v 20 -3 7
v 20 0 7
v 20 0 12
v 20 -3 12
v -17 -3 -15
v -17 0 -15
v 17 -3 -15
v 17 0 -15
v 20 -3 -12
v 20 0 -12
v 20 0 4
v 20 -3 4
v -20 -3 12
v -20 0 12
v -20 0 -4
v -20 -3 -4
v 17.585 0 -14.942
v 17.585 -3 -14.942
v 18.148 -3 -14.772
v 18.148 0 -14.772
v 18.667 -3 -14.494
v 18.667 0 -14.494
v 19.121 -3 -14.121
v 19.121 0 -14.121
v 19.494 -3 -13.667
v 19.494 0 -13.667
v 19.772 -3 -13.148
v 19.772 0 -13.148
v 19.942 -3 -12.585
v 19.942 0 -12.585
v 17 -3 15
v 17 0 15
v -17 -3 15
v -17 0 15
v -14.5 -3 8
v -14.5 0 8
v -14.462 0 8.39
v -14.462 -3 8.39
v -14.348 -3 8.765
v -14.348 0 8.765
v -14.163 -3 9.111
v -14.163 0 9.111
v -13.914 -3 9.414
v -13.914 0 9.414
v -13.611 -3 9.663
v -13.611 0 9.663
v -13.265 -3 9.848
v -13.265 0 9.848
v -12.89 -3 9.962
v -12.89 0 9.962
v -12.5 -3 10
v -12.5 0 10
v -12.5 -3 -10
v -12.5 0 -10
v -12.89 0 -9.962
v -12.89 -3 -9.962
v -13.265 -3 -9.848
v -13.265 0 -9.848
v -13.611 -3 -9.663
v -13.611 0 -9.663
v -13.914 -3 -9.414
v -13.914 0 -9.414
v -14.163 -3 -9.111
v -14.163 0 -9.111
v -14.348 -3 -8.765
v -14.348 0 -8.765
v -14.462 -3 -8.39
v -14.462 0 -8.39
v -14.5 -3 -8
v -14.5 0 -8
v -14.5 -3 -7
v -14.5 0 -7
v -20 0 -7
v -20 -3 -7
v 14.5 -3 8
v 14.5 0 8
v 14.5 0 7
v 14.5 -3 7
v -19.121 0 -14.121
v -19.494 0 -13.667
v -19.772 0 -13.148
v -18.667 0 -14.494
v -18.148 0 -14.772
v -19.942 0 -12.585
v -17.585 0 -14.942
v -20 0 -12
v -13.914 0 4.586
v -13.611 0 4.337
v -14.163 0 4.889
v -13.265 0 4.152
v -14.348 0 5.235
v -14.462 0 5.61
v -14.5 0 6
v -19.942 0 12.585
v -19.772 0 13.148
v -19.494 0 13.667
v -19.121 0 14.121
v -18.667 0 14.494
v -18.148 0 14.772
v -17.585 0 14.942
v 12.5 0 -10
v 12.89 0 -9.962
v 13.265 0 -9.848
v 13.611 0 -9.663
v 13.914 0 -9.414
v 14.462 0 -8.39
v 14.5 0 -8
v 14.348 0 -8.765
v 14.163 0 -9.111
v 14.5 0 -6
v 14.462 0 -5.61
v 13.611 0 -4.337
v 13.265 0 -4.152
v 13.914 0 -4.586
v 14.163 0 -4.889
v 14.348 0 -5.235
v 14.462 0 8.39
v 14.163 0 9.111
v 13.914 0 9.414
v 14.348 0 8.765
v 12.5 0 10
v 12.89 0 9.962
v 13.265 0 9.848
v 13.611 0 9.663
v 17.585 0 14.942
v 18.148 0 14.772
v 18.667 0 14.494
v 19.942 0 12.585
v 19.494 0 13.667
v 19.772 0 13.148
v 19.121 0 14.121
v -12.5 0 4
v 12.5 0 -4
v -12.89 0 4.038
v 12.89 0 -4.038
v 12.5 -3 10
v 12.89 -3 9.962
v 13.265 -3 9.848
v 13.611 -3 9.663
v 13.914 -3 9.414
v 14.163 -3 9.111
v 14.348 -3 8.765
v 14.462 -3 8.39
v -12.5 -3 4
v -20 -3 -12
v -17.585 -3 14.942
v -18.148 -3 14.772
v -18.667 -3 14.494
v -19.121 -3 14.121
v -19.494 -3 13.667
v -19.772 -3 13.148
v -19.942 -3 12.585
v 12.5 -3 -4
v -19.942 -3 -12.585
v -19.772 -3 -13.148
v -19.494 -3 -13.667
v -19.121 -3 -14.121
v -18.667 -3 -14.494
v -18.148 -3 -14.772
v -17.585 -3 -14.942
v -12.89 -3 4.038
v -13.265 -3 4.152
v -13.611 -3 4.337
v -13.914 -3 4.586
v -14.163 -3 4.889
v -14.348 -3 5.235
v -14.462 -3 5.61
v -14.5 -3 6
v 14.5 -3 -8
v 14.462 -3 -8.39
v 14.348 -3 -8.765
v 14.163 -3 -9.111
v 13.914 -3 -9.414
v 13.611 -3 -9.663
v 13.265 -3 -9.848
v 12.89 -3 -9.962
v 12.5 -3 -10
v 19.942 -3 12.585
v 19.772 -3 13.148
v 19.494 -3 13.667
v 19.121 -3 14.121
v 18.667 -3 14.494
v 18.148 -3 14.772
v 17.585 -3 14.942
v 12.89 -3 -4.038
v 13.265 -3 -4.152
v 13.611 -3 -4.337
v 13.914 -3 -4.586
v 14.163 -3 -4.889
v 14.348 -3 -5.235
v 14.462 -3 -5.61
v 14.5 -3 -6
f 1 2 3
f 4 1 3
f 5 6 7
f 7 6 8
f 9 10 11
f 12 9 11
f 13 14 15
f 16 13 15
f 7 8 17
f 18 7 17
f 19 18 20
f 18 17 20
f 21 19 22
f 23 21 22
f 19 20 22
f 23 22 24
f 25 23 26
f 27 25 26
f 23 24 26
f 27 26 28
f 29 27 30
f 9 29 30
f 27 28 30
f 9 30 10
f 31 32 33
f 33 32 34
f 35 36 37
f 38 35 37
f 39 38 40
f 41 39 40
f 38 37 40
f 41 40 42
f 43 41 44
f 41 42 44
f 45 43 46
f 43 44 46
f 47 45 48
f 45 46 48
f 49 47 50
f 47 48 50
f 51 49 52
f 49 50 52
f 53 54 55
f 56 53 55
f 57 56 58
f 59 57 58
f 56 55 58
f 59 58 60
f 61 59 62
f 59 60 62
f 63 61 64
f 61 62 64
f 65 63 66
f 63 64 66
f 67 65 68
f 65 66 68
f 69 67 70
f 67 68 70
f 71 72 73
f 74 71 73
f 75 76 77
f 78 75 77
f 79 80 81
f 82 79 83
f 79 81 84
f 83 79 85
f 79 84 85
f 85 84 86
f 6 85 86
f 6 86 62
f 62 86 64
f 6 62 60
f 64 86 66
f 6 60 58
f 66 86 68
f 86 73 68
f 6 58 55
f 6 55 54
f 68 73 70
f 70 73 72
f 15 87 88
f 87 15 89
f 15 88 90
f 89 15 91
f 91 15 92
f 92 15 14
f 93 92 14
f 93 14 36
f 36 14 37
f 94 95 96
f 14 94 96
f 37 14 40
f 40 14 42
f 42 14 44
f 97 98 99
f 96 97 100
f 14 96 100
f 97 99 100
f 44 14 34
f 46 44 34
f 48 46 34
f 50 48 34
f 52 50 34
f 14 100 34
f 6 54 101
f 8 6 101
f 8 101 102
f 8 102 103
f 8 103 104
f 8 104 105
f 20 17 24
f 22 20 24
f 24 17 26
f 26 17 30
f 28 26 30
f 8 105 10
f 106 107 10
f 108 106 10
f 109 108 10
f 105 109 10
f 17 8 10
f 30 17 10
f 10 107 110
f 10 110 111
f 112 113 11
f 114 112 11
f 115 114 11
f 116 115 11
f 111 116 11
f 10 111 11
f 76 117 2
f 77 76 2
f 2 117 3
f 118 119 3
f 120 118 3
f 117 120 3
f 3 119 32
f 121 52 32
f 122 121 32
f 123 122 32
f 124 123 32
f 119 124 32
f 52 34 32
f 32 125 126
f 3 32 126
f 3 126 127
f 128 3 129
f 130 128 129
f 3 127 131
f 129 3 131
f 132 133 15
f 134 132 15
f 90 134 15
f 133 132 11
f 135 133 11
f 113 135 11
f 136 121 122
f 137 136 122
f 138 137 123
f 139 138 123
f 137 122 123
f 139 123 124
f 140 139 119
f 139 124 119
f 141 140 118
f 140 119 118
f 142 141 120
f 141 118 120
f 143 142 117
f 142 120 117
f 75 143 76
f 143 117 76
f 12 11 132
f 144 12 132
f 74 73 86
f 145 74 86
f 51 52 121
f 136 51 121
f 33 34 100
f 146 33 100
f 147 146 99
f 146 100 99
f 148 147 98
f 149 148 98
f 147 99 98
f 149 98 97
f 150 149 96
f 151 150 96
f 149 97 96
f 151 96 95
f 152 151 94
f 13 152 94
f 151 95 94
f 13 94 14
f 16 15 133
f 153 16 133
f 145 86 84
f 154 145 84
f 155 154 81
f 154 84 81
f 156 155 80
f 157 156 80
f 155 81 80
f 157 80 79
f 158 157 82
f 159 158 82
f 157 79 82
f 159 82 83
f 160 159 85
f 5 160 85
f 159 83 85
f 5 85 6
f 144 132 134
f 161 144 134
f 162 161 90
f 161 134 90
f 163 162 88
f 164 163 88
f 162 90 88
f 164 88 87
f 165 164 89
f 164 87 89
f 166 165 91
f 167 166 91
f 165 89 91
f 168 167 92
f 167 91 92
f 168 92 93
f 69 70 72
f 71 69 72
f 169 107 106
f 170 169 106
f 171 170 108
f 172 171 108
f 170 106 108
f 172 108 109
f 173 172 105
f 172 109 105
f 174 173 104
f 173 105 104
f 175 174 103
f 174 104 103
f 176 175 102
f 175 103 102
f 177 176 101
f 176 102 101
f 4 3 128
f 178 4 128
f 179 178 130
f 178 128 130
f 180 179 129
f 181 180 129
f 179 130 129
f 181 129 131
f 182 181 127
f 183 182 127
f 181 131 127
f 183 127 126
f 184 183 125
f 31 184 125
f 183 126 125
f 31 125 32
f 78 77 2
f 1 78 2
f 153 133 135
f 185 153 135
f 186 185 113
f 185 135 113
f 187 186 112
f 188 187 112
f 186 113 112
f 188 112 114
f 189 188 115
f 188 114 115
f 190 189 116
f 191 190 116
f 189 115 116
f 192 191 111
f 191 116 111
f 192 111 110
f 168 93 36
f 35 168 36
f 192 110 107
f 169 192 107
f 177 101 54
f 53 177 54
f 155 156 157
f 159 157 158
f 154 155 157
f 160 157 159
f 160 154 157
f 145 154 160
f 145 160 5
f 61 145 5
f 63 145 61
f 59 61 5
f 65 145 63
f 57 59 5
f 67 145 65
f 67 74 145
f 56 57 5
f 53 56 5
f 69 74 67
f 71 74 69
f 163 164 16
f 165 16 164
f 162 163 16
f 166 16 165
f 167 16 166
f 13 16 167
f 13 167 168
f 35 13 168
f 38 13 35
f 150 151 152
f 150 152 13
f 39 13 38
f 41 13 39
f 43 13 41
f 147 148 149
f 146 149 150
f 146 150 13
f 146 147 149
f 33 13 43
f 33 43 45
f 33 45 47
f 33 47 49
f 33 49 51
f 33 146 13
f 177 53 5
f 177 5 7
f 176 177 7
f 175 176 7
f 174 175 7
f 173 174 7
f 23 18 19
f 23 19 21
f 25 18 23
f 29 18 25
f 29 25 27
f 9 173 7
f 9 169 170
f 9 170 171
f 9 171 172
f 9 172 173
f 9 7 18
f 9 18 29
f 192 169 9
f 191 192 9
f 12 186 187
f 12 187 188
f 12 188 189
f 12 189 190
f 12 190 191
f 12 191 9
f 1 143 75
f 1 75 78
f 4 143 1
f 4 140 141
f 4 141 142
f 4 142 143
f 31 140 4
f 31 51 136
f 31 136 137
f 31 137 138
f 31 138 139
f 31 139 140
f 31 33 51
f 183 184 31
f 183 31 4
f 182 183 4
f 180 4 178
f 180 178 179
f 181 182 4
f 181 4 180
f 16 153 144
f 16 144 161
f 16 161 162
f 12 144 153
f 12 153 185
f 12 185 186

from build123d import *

# Parameters (mm, degrees)
F1_DEPTH = 3


with BuildPart() as f1:
    # F0 (on Front) → F1 (new body)
    with BuildSketch(Plane.XZ):
        with BuildLine():
            ThreePointArc((20, 12), (19.12132, 14.12132), (17, 15))
            Line((17, 15), (-17, 15))
            ThreePointArc((-17, 15), (-19.12132, 14.12132), (-20, 12))
            Line((-20, 12), (-20, -4))
            Line((-20, -4), (12.5, -4))
            ThreePointArc((12.5, -4), (13.914214, -4.585786), (14.5, -6))
            Line((14.5, -6), (14.5, -8))
            ThreePointArc((14.5, -8), (13.914214, -9.414214), (12.5, -10))
            Line((12.5, -10), (-12.5, -10))
            ThreePointArc((-12.5, -10), (-13.914214, -9.414214), (-14.5, -8))
            Line((-14.5, -8), (-14.5, -7))
            Line((-14.5, -7), (-20, -7))
            Line((-20, -7), (-20, -12))
            ThreePointArc((-20, -12), (-19.12132, -14.12132), (-17, -15))
            Line((-17, -15), (17, -15))
            ThreePointArc((17, -15), (19.12132, -14.12132), (20, -12))
            Line((20, -12), (20, 4))
            Line((20, 4), (-12.5, 4))
            ThreePointArc((-12.5, 4), (-13.914214, 4.585786), (-14.5, 6))
            Line((-14.5, 6), (-14.5, 8))
            ThreePointArc((-14.5, 8), (-13.914214, 9.414214), (-12.5, 10))
            Line((-12.5, 10), (12.5, 10))
            ThreePointArc((12.5, 10), (13.914214, 9.414214), (14.5, 8))
            Line((14.5, 8), (14.5, 7))
            Line((14.5, 7), (20, 7))
            Line((20, 7), (20, 12))
        make_face()
    extrude(amount=F1_DEPTH)


solid = f1.part
